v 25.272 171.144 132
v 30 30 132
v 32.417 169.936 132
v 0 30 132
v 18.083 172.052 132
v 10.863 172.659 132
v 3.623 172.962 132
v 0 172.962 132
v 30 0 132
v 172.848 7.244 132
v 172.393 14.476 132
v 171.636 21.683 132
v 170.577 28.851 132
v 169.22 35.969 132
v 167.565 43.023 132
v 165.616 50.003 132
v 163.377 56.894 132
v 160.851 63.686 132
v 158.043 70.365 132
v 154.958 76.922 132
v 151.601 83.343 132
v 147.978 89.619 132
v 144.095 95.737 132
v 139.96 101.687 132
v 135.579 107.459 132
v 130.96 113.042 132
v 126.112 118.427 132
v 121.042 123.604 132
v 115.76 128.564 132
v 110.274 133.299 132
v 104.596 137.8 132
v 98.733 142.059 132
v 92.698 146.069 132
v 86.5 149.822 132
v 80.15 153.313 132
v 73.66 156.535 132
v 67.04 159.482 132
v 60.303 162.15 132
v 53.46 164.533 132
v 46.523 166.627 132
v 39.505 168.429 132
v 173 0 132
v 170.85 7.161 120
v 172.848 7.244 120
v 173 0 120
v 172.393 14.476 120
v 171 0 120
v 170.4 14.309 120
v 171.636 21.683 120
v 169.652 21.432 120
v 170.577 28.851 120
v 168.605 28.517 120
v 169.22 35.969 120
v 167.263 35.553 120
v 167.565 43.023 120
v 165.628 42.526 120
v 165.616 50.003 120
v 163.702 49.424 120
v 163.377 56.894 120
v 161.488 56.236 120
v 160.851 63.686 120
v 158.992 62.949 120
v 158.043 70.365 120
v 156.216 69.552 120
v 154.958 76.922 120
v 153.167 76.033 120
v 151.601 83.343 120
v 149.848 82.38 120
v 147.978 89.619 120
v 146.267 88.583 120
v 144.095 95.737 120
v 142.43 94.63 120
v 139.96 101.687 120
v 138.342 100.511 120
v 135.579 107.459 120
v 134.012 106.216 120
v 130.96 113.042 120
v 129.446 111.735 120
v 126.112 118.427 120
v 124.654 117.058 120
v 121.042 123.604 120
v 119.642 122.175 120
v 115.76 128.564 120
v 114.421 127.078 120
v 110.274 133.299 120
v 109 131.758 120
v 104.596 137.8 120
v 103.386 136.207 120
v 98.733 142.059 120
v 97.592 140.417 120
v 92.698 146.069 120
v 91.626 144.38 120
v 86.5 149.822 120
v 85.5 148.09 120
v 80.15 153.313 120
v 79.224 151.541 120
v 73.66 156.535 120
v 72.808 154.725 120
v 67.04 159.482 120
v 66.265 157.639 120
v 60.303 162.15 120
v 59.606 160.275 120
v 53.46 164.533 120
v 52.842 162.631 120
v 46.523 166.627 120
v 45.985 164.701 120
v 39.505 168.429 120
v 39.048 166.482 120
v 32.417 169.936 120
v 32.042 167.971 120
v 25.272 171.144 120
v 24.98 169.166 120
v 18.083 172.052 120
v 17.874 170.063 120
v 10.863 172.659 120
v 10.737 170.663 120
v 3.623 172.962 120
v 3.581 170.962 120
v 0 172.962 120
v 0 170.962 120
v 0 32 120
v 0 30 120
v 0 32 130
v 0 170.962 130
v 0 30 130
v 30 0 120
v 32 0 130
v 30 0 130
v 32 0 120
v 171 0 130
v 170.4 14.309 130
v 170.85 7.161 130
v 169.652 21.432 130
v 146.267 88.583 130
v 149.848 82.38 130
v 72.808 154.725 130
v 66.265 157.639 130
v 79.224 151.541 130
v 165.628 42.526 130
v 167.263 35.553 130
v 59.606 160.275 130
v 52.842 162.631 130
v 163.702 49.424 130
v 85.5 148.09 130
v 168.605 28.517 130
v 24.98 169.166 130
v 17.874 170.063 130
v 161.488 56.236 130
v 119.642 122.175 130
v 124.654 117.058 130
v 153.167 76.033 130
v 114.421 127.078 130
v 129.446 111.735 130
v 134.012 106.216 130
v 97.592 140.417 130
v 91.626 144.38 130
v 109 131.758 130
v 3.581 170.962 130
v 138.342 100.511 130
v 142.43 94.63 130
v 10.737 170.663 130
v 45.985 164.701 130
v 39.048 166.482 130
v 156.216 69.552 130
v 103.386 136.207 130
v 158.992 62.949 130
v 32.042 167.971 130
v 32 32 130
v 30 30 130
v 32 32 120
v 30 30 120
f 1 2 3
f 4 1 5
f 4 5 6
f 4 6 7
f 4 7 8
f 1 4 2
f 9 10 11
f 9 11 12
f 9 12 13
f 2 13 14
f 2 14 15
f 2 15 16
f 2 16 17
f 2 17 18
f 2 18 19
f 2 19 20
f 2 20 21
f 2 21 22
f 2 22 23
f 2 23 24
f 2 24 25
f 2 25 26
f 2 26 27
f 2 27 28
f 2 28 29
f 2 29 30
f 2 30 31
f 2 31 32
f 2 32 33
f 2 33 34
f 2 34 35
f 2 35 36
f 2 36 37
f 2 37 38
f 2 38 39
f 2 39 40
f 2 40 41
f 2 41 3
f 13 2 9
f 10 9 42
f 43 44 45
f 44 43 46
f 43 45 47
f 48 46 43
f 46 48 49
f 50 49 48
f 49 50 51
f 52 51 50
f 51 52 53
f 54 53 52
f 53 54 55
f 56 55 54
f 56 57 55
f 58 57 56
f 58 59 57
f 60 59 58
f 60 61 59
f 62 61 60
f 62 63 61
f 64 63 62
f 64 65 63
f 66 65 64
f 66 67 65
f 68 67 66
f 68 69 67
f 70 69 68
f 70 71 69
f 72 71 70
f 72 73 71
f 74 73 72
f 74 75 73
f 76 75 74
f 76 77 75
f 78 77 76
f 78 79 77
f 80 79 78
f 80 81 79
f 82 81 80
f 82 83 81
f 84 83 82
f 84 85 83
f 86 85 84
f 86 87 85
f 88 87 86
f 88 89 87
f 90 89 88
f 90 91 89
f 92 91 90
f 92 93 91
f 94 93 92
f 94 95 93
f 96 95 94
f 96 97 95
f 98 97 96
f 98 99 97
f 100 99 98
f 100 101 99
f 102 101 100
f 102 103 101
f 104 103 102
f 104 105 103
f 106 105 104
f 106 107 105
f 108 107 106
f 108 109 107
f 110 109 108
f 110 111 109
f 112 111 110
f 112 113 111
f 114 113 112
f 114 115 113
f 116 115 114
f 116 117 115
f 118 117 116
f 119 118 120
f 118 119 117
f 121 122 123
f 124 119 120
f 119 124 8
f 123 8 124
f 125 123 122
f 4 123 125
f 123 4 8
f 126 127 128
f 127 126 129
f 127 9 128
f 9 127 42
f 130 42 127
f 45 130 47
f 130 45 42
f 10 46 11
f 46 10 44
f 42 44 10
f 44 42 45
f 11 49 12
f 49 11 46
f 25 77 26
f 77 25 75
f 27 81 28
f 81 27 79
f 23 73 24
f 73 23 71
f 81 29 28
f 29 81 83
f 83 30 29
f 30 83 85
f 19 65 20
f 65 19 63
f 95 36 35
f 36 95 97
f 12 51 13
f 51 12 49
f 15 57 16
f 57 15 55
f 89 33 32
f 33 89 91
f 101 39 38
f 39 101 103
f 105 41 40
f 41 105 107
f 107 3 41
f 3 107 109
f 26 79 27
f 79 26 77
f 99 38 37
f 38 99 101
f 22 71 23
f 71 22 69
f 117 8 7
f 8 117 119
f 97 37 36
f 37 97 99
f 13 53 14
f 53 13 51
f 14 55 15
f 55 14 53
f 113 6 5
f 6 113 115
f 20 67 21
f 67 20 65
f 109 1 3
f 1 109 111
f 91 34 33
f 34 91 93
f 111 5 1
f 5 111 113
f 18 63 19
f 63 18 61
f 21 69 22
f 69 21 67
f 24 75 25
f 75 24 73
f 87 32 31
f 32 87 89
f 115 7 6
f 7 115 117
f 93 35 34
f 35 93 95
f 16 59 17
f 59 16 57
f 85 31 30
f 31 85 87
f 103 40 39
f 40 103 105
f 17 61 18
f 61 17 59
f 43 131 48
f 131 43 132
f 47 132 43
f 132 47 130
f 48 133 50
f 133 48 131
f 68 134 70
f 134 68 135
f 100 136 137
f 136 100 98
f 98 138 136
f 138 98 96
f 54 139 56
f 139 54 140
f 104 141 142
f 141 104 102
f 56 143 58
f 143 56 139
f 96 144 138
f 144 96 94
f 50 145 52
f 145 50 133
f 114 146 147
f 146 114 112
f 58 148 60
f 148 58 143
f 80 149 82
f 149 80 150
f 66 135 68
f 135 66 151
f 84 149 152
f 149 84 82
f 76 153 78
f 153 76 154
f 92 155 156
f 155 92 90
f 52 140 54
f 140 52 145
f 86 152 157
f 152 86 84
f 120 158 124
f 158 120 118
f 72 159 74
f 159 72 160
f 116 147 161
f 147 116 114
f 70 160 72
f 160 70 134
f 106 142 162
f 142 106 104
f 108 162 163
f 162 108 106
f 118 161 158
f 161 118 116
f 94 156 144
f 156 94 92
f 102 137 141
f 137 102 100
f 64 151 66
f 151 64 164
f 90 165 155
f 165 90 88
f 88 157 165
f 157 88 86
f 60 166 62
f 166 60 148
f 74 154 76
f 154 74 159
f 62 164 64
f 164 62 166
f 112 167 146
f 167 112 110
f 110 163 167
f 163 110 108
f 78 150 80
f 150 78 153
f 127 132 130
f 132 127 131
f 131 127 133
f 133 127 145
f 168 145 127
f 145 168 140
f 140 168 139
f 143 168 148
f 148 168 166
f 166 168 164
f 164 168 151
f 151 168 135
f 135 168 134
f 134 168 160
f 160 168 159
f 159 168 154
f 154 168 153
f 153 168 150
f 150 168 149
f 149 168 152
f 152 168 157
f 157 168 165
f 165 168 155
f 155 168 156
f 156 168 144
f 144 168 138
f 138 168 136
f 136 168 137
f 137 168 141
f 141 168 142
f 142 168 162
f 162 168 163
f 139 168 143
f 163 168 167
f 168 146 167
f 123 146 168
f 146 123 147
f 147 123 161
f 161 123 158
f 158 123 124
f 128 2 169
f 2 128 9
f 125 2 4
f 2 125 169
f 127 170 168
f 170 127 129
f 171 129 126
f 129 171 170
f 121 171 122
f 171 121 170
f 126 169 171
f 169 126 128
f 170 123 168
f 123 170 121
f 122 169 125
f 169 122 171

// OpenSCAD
// file: bezier.scad
module line(p1,p2,w) {
    hull() {
        translate(p1) circle(r=w);
        translate(p2) circle(r=w);
    }
}
module polyline(points, index, w) {
    if(index < len(points)) {
        line(points[index - 1], points[index],w);
        polyline(points, index + 1, w);
    }
}

function choose(n, k)=
     k == 0? 1
    : (n * choose(n - 1, k - 1)) / k;

function _point_on_bezier_rec(points,t,i,c)=
    len(points) == i ? c
    : _point_on_bezier_rec(points,t,i+1,c+choose(len(points)-1,i) * pow(t,i) * pow(1-t,len(points)-i-1) * points[i]);

function _point_on_bezier(points,t)=
    _point_on_bezier_rec(points,t,0,[0,0]);

//a bezier curve with any number of control points
//parameters: 
//points - the control points of the bezier curve (number of points is variable)
//resolution - the sampling resolution of the bezier curve (number of returned points)
//returns:
//resolution number of samples on the bezier curve
function bezier(points,fn)=[
    for (t =[0:1.0/fn:1+(1/fn/2)]) _point_on_bezier(points, t)
    ];

//create a 3D rotational model with a bezier curve of given points, resolution and thickness
module bezier_model(points,resolution,thickness) {
    translate([0,0,thickness/2]) rotate_extrude() polyline(bezier(points,resolution),1,thickness/2);
}
    
// main file
use <bezier.scad>

print_base = false;
print_roof = true;

$fn = 150;

//length and width
l = 170;
//height
h = 120;
//height inner
hi = 70;
//center cut out length
cl = 33;



//thickness of walls
s = 2;

//for compensate imprecise print
e = 1;

//big integer
b = 1000000;

//horizontal holder offset
hdx = 90;
//vertical holder offset
hdy = 11.5*8;

//holder width 1
hw1 = 9.5;
//holder width 2
hw2 = 12.5;
//holder length 1
hd1 = 2;
//holder length 2
hd2 = 3;
//holder zize
hl = 40;
 
hole_height = h/3;
hole_r = 30;
air_hole_r = 3; 
stand_r = 8;
stand_l = 50;

module holder(hw1,hw2,hd1,hd2,hl) {
    translate([0,-hl/2,-hw1/2])cube([hd1,hl,hw1]);
    translate([hd1,-hl/2,-hw2/2]) cube([hd2,hl,hw2]);
} 

module holder_hook(hw1,hw2,hd1,hd2,hl) {
    translate([0,-hl/2,-hw1/2])cube([hd1,hl,hw1]);
    translate([hd1,-hl/2,-hw1/2]) cube([hd2,hl,hw2]);
} 

if(print_base) {

    translate([0,hdx,hw2/2])rotate([0,0,180])holder(hw1,hw2,hd1,hd2,hl);
    translate([hdx,0,hw2/2])rotate([0,0,-90])holder(hw1,hw2,hd1,hd2,hl);
    translate([0,hdx,hw2/2+hdy])rotate([0,0,180])holder_hook(hw1,hw2,hd1,hd2,hl);
    translate([hdx,0,hw2/2+hdy])rotate([0,0,-90])holder_hook(hw1,hw2,hd1,hd2,hl);

    difference(){
        intersection() {
        cube([l,l,h]);
        cylinder(h,l,l);
         }
            
        intersection(){
         translate([s,s,s])cube([l-2*s,l-2*s,h]);
        cylinder(h,l-s,l-s);
        }
        
        //cut out innermost cube
        cube([cl,cl,h]);
        

        //cut holes in bottom
        rotate([0,0,25])translate([l*0.4,0,0]) cylinder(s,air_hole_r,air_hole_r);
        rotate([0,0,25])translate([l*0.6,0,0]) cylinder(s,air_hole_r,air_hole_r);
        rotate([0,0,25])translate([l*0.8,0,0]) cylinder(s,air_hole_r,air_hole_r);
        rotate([0,0,45])translate([l*0.4,0,0]) cylinder(s,air_hole_r,air_hole_r);
        rotate([0,0,45])translate([l*0.6,0,0]) cylinder(s,air_hole_r,air_hole_r);
        rotate([0,0,45])translate([l*0.8,0,0]) cylinder(s,air_hole_r,air_hole_r);
        rotate([0,0,65])translate([l*0.4,0,0]) cylinder(s,air_hole_r,air_hole_r);
        rotate([0,0,65])translate([l*0.6,0,0]) cylinder(s,air_hole_r,air_hole_r);
        rotate([0,0,65])translate([l*0.8,0,0]) cylinder(s,air_hole_r,air_hole_r);
        

        //front hole
        translate([l/2,l/2,hole_height]) rotate([0,90,45])cylinder(b,hole_r,hole_r);

        
        }
        difference() {
         rotate([0,0,45])translate([l-s,0,0]) rotate([0,90,0]) cylinder(stand_l,stand_r,stand_r);
         translate([0,0,-1000])cube(1000,1000,1000);
            }


        difference(){
            cube([cl+s,cl+s,h]);
            cube([cl,cl,h]);
        }
        
   
    }

roof_edge = 10;
if(print_roof) {
    translate([0,0,h]) {
        difference(){
            intersection() {
        cube([l+s+e,l+s+e,s+roof_edge]);
        cylinder(s+roof_edge,l+s+e,l+s+e);
         }
        cylinder(roof_edge,l+e,l+e);
         
        //cut out innermost cube
        cube([cl-s-e,cl-s-e,h]);
        
        
     }
     translate([cl-s-e,0,0]) cube([s,cl-e,roof_edge]);
     translate([0,cl-s-e,0]) cube([cl-e,s,roof_edge]);

     }
    
}
